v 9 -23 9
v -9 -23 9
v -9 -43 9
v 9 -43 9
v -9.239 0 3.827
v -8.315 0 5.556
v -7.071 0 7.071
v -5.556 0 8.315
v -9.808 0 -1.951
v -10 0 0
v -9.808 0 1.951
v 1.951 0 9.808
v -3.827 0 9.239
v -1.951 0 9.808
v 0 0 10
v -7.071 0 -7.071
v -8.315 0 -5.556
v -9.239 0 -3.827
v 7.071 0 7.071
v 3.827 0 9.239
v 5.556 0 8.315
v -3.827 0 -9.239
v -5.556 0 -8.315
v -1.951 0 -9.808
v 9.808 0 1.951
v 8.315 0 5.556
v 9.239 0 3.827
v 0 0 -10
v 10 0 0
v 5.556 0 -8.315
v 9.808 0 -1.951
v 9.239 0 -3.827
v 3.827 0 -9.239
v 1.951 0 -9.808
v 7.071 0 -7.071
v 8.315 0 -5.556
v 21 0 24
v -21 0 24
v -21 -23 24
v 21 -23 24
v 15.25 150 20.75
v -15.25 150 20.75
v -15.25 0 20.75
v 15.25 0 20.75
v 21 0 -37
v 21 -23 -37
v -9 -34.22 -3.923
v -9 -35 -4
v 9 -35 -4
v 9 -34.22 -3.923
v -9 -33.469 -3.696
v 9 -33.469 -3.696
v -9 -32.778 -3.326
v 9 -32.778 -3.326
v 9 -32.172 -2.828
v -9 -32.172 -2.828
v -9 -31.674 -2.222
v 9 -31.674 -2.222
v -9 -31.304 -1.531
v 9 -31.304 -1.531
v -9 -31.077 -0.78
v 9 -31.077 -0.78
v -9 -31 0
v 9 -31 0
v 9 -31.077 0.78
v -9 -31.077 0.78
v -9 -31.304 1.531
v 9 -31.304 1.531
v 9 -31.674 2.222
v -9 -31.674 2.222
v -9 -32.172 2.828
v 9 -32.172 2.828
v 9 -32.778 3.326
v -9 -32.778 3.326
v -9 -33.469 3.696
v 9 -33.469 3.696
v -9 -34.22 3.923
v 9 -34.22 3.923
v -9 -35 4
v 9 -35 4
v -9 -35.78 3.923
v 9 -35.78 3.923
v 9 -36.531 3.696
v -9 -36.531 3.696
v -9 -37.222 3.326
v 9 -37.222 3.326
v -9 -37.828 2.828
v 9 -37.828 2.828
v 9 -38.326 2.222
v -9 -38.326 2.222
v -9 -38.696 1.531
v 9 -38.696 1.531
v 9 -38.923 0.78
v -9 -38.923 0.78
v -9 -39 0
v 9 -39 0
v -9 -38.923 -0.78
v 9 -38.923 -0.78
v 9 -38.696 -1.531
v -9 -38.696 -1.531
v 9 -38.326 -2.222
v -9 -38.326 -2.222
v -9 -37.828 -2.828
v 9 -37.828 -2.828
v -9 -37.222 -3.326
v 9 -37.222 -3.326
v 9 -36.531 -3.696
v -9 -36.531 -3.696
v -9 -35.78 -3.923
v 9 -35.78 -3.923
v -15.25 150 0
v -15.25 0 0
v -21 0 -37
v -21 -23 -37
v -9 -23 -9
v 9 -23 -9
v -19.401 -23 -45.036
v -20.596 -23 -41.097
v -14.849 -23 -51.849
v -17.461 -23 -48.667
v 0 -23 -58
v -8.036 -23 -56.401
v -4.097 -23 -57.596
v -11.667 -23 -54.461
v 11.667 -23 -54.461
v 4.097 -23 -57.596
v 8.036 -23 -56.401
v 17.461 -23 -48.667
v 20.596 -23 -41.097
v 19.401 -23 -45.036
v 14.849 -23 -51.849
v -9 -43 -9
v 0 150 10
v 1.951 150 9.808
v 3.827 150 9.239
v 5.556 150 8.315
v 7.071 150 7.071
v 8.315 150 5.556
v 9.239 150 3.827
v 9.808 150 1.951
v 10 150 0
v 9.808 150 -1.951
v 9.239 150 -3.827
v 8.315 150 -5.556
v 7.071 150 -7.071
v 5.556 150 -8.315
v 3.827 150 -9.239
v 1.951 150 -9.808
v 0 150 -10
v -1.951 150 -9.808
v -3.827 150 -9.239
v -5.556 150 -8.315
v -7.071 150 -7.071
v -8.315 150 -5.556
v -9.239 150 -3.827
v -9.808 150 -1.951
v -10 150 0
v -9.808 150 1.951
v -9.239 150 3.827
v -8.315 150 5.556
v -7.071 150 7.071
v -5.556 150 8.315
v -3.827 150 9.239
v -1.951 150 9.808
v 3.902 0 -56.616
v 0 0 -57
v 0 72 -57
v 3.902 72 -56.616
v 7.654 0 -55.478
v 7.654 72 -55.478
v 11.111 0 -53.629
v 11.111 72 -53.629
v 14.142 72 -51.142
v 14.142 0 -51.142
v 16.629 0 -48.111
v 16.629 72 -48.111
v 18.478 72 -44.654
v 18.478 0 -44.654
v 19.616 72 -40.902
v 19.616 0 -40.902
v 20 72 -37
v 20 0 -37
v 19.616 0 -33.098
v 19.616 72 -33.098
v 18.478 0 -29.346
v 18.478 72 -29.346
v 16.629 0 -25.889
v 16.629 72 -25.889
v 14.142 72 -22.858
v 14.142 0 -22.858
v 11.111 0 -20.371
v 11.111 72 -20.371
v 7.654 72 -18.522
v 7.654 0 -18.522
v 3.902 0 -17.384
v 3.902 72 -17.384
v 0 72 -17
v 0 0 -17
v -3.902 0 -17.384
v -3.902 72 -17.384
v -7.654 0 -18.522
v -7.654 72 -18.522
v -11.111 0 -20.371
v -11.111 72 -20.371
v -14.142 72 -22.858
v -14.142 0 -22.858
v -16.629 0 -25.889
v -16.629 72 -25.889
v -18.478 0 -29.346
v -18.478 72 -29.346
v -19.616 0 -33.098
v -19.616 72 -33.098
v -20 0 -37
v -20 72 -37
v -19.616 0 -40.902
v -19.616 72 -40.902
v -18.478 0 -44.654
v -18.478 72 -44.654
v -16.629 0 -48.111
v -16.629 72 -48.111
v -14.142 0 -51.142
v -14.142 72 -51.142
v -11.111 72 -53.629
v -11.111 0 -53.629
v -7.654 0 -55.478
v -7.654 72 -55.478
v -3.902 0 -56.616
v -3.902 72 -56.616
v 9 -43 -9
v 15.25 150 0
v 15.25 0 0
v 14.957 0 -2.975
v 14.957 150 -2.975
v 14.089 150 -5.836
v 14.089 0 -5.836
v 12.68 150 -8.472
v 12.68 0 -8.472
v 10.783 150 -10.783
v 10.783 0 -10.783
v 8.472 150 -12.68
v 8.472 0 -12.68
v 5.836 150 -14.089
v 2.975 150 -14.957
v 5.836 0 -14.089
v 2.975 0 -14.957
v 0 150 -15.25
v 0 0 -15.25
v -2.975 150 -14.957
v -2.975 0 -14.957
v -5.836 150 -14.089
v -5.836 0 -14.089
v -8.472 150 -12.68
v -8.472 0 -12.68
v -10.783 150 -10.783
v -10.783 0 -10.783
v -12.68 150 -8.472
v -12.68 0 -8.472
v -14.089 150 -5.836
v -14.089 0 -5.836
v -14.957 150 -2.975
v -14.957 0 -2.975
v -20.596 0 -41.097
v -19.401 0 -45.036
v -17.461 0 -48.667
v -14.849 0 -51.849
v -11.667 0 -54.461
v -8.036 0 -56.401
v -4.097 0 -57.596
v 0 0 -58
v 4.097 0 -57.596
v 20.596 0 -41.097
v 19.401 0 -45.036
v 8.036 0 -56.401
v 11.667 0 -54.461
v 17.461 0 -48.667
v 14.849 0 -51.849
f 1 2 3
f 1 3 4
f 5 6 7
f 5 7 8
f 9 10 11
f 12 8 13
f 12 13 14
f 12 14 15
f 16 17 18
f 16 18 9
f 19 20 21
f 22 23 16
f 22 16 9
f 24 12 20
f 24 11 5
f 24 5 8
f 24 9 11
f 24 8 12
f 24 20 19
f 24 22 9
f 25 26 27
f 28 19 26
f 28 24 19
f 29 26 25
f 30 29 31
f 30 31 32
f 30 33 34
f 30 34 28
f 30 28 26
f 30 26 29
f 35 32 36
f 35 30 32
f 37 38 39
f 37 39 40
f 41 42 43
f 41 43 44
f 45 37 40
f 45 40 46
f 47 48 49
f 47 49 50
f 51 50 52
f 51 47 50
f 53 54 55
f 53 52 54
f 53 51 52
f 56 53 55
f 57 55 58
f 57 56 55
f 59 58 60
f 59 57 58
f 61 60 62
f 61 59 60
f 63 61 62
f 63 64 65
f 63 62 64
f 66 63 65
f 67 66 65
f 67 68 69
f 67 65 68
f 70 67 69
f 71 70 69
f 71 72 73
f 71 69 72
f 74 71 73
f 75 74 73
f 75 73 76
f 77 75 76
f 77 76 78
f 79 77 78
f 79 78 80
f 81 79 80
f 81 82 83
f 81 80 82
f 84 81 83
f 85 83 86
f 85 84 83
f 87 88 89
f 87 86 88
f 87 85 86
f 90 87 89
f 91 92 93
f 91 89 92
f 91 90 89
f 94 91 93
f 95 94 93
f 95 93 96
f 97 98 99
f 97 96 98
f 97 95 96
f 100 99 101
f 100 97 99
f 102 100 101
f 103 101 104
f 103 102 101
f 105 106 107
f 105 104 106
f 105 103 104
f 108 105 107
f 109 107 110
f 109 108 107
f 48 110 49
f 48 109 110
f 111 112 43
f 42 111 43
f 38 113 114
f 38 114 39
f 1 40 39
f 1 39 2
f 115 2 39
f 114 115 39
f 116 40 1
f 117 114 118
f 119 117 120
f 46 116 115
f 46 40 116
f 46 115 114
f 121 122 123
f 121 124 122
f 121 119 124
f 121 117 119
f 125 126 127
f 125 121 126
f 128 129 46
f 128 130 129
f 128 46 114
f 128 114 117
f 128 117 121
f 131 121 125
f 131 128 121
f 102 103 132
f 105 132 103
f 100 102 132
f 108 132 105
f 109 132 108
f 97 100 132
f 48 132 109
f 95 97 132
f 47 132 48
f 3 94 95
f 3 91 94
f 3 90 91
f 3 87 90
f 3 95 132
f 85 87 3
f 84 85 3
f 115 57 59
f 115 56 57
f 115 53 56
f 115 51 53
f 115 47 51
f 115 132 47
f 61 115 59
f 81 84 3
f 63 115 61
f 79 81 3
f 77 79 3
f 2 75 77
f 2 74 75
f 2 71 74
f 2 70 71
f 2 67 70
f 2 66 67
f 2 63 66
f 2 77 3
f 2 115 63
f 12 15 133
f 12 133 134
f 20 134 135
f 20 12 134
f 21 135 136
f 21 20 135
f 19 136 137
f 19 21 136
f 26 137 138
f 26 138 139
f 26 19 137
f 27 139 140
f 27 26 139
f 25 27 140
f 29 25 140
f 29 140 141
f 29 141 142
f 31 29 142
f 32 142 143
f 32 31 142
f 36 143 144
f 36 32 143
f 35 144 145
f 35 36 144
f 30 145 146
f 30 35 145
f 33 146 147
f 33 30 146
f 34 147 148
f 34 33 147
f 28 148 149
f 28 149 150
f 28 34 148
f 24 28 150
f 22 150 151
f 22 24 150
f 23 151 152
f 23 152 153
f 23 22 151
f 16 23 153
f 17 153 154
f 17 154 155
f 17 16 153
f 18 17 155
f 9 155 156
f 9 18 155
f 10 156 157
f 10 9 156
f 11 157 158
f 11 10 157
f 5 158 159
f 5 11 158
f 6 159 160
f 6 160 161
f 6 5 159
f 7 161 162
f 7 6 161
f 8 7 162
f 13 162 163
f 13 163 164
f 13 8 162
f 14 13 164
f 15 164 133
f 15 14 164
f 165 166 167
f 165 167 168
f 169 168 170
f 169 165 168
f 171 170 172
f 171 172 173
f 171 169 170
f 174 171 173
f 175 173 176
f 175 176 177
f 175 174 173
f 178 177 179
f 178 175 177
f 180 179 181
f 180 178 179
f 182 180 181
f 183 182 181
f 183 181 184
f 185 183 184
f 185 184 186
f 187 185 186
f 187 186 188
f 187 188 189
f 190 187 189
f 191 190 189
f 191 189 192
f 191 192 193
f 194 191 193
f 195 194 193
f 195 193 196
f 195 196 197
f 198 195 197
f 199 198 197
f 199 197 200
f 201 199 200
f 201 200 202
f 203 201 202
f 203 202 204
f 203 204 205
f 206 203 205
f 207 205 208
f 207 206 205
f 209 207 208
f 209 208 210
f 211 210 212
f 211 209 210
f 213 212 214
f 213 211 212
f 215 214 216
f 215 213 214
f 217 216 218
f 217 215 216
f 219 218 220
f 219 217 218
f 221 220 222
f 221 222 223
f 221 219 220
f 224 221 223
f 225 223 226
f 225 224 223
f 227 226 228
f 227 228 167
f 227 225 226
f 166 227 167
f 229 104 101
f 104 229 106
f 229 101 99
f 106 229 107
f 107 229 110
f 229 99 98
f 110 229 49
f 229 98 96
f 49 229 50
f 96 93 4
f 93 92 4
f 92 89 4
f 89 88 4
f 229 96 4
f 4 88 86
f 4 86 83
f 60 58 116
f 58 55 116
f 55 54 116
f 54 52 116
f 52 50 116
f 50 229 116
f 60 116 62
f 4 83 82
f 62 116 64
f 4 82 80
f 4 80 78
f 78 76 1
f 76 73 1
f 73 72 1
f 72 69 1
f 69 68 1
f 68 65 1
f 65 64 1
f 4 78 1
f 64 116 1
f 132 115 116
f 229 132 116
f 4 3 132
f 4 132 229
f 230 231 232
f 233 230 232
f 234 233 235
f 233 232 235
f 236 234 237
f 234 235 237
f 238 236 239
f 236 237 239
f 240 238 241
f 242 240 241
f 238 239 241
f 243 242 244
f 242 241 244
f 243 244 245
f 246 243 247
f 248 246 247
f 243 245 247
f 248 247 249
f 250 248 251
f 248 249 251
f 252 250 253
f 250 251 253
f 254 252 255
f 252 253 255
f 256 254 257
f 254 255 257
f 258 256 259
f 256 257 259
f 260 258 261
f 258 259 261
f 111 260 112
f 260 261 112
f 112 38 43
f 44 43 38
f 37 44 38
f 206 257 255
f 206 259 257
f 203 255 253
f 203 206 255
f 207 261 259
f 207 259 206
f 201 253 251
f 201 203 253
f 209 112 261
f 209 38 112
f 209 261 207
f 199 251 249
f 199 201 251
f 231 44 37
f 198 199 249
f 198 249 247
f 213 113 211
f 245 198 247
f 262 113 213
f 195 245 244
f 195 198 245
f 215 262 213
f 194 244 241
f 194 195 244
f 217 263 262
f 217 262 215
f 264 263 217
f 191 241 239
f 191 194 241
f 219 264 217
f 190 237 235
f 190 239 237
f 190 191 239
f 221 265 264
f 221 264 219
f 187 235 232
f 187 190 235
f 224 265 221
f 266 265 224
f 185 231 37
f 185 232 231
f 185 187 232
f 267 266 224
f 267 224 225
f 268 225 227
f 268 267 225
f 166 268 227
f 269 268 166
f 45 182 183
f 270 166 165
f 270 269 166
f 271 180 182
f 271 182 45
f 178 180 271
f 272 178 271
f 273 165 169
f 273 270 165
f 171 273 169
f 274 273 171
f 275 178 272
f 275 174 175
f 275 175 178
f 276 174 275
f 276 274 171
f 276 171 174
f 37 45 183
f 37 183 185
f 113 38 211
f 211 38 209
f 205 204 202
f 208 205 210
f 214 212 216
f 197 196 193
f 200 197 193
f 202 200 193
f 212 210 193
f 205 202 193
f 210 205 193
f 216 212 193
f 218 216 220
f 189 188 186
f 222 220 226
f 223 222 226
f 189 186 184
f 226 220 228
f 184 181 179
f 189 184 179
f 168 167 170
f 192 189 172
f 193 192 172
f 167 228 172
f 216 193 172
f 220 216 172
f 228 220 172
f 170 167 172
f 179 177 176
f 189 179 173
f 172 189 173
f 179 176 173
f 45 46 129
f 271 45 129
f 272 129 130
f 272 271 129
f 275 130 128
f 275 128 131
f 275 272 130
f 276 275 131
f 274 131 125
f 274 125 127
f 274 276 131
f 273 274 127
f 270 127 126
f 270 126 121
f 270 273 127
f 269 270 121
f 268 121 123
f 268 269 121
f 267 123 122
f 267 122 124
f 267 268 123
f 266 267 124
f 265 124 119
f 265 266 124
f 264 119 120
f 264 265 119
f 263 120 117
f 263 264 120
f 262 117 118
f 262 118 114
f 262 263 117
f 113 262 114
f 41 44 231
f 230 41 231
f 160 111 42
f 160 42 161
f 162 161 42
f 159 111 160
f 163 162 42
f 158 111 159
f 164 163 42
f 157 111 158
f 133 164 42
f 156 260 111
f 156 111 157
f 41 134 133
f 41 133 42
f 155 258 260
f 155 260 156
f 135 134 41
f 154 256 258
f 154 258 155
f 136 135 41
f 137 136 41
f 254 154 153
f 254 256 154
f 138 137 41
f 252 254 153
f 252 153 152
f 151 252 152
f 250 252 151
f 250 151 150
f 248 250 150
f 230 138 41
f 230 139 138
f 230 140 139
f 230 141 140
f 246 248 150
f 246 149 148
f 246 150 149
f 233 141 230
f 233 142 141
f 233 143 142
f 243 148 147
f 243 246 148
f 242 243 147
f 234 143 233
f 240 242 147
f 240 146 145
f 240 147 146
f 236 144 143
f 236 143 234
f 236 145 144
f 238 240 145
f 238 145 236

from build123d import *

# Parameters (mm, degrees)
BOSS_EXTRUDE1_DEPTH     = 23
SKETCH2_W               = 18
SKETCH2_H               = 18
BOSS_EXTRUDE2_DEPTH     = 20
CUT_EXTRUDE1_DEPTH      = 76.193084788
CUT_EXTRUDE1_DEPTH_BACK = 76.193084788
SKETCH3_R               = 4
SKETCH4_R               = 20
BOSS_EXTRUDE3_DEPTH     = 95
SKETCH5_R               = 10
BOSS_EXTRUDE4_DEPTH     = 150


with BuildPart() as part:
    # Sketch1 → Boss-Extrude1 (new body)
    with BuildSketch(Plane(origin=(0, 0, 0), x_dir=(1, 0, 0), z_dir=(0, 1, 0))):
        with BuildLine():
            Line((-21, -24), (21, -24))
            Line((21, -24), (21, 37))
            ThreePointArc((21, 37), (0, 58), (-21, 37))
            Line((-21, 37), (-21, -24))
        make_face()
    extrude(amount=-BOSS_EXTRUDE1_DEPTH)

    # Sketch2 → Boss-Extrude2 (add)
    with BuildSketch(Plane.XZ.offset(23)):
        Rectangle(SKETCH2_W, SKETCH2_H)
    extrude(amount=BOSS_EXTRUDE2_DEPTH)

    # Sketch3 → Cut-Extrude1 (cut, two sides: drawn at the far end of the back side and taken through both)
    with BuildSketch(Plane(origin=(0, 0, 0), x_dir=(0, 0, -1), z_dir=(1, 0, 0)).offset(-CUT_EXTRUDE1_DEPTH_BACK)):
        with Locations((0, -35)):
            Circle(SKETCH3_R)
    extrude(amount=CUT_EXTRUDE1_DEPTH + CUT_EXTRUDE1_DEPTH_BACK, mode=Mode.SUBTRACT)

    # Sketch4 → Boss-Extrude3 (add)
    with BuildSketch(Plane.XZ.offset(23)):
        with Locations(Location((0, -37, 0), (0, 0, 270))):
            Circle(SKETCH4_R)
    extrude(amount=-BOSS_EXTRUDE3_DEPTH)

    # Sketch5 → Boss-Extrude4 (add)
    with BuildSketch(Plane(origin=(0, 0, 0), x_dir=(1, 0, 0), z_dir=(0, 1, 0))):
        with BuildLine():
            Line((-15.25, 0), (-15.25, -20.75))
            Line((-15.25, -20.75), (15.25, -20.75))
            Line((15.25, -20.75), (15.25, 0))
            ThreePointArc((15.25, 0), (0, 15.25), (-15.25, 0))
        make_face()
        with Locations(Location((0, 0, 0), (0, 0, 270))):
            Circle(SKETCH5_R, mode=Mode.SUBTRACT)
    extrude(amount=BOSS_EXTRUDE4_DEPTH)


solid = part.part
